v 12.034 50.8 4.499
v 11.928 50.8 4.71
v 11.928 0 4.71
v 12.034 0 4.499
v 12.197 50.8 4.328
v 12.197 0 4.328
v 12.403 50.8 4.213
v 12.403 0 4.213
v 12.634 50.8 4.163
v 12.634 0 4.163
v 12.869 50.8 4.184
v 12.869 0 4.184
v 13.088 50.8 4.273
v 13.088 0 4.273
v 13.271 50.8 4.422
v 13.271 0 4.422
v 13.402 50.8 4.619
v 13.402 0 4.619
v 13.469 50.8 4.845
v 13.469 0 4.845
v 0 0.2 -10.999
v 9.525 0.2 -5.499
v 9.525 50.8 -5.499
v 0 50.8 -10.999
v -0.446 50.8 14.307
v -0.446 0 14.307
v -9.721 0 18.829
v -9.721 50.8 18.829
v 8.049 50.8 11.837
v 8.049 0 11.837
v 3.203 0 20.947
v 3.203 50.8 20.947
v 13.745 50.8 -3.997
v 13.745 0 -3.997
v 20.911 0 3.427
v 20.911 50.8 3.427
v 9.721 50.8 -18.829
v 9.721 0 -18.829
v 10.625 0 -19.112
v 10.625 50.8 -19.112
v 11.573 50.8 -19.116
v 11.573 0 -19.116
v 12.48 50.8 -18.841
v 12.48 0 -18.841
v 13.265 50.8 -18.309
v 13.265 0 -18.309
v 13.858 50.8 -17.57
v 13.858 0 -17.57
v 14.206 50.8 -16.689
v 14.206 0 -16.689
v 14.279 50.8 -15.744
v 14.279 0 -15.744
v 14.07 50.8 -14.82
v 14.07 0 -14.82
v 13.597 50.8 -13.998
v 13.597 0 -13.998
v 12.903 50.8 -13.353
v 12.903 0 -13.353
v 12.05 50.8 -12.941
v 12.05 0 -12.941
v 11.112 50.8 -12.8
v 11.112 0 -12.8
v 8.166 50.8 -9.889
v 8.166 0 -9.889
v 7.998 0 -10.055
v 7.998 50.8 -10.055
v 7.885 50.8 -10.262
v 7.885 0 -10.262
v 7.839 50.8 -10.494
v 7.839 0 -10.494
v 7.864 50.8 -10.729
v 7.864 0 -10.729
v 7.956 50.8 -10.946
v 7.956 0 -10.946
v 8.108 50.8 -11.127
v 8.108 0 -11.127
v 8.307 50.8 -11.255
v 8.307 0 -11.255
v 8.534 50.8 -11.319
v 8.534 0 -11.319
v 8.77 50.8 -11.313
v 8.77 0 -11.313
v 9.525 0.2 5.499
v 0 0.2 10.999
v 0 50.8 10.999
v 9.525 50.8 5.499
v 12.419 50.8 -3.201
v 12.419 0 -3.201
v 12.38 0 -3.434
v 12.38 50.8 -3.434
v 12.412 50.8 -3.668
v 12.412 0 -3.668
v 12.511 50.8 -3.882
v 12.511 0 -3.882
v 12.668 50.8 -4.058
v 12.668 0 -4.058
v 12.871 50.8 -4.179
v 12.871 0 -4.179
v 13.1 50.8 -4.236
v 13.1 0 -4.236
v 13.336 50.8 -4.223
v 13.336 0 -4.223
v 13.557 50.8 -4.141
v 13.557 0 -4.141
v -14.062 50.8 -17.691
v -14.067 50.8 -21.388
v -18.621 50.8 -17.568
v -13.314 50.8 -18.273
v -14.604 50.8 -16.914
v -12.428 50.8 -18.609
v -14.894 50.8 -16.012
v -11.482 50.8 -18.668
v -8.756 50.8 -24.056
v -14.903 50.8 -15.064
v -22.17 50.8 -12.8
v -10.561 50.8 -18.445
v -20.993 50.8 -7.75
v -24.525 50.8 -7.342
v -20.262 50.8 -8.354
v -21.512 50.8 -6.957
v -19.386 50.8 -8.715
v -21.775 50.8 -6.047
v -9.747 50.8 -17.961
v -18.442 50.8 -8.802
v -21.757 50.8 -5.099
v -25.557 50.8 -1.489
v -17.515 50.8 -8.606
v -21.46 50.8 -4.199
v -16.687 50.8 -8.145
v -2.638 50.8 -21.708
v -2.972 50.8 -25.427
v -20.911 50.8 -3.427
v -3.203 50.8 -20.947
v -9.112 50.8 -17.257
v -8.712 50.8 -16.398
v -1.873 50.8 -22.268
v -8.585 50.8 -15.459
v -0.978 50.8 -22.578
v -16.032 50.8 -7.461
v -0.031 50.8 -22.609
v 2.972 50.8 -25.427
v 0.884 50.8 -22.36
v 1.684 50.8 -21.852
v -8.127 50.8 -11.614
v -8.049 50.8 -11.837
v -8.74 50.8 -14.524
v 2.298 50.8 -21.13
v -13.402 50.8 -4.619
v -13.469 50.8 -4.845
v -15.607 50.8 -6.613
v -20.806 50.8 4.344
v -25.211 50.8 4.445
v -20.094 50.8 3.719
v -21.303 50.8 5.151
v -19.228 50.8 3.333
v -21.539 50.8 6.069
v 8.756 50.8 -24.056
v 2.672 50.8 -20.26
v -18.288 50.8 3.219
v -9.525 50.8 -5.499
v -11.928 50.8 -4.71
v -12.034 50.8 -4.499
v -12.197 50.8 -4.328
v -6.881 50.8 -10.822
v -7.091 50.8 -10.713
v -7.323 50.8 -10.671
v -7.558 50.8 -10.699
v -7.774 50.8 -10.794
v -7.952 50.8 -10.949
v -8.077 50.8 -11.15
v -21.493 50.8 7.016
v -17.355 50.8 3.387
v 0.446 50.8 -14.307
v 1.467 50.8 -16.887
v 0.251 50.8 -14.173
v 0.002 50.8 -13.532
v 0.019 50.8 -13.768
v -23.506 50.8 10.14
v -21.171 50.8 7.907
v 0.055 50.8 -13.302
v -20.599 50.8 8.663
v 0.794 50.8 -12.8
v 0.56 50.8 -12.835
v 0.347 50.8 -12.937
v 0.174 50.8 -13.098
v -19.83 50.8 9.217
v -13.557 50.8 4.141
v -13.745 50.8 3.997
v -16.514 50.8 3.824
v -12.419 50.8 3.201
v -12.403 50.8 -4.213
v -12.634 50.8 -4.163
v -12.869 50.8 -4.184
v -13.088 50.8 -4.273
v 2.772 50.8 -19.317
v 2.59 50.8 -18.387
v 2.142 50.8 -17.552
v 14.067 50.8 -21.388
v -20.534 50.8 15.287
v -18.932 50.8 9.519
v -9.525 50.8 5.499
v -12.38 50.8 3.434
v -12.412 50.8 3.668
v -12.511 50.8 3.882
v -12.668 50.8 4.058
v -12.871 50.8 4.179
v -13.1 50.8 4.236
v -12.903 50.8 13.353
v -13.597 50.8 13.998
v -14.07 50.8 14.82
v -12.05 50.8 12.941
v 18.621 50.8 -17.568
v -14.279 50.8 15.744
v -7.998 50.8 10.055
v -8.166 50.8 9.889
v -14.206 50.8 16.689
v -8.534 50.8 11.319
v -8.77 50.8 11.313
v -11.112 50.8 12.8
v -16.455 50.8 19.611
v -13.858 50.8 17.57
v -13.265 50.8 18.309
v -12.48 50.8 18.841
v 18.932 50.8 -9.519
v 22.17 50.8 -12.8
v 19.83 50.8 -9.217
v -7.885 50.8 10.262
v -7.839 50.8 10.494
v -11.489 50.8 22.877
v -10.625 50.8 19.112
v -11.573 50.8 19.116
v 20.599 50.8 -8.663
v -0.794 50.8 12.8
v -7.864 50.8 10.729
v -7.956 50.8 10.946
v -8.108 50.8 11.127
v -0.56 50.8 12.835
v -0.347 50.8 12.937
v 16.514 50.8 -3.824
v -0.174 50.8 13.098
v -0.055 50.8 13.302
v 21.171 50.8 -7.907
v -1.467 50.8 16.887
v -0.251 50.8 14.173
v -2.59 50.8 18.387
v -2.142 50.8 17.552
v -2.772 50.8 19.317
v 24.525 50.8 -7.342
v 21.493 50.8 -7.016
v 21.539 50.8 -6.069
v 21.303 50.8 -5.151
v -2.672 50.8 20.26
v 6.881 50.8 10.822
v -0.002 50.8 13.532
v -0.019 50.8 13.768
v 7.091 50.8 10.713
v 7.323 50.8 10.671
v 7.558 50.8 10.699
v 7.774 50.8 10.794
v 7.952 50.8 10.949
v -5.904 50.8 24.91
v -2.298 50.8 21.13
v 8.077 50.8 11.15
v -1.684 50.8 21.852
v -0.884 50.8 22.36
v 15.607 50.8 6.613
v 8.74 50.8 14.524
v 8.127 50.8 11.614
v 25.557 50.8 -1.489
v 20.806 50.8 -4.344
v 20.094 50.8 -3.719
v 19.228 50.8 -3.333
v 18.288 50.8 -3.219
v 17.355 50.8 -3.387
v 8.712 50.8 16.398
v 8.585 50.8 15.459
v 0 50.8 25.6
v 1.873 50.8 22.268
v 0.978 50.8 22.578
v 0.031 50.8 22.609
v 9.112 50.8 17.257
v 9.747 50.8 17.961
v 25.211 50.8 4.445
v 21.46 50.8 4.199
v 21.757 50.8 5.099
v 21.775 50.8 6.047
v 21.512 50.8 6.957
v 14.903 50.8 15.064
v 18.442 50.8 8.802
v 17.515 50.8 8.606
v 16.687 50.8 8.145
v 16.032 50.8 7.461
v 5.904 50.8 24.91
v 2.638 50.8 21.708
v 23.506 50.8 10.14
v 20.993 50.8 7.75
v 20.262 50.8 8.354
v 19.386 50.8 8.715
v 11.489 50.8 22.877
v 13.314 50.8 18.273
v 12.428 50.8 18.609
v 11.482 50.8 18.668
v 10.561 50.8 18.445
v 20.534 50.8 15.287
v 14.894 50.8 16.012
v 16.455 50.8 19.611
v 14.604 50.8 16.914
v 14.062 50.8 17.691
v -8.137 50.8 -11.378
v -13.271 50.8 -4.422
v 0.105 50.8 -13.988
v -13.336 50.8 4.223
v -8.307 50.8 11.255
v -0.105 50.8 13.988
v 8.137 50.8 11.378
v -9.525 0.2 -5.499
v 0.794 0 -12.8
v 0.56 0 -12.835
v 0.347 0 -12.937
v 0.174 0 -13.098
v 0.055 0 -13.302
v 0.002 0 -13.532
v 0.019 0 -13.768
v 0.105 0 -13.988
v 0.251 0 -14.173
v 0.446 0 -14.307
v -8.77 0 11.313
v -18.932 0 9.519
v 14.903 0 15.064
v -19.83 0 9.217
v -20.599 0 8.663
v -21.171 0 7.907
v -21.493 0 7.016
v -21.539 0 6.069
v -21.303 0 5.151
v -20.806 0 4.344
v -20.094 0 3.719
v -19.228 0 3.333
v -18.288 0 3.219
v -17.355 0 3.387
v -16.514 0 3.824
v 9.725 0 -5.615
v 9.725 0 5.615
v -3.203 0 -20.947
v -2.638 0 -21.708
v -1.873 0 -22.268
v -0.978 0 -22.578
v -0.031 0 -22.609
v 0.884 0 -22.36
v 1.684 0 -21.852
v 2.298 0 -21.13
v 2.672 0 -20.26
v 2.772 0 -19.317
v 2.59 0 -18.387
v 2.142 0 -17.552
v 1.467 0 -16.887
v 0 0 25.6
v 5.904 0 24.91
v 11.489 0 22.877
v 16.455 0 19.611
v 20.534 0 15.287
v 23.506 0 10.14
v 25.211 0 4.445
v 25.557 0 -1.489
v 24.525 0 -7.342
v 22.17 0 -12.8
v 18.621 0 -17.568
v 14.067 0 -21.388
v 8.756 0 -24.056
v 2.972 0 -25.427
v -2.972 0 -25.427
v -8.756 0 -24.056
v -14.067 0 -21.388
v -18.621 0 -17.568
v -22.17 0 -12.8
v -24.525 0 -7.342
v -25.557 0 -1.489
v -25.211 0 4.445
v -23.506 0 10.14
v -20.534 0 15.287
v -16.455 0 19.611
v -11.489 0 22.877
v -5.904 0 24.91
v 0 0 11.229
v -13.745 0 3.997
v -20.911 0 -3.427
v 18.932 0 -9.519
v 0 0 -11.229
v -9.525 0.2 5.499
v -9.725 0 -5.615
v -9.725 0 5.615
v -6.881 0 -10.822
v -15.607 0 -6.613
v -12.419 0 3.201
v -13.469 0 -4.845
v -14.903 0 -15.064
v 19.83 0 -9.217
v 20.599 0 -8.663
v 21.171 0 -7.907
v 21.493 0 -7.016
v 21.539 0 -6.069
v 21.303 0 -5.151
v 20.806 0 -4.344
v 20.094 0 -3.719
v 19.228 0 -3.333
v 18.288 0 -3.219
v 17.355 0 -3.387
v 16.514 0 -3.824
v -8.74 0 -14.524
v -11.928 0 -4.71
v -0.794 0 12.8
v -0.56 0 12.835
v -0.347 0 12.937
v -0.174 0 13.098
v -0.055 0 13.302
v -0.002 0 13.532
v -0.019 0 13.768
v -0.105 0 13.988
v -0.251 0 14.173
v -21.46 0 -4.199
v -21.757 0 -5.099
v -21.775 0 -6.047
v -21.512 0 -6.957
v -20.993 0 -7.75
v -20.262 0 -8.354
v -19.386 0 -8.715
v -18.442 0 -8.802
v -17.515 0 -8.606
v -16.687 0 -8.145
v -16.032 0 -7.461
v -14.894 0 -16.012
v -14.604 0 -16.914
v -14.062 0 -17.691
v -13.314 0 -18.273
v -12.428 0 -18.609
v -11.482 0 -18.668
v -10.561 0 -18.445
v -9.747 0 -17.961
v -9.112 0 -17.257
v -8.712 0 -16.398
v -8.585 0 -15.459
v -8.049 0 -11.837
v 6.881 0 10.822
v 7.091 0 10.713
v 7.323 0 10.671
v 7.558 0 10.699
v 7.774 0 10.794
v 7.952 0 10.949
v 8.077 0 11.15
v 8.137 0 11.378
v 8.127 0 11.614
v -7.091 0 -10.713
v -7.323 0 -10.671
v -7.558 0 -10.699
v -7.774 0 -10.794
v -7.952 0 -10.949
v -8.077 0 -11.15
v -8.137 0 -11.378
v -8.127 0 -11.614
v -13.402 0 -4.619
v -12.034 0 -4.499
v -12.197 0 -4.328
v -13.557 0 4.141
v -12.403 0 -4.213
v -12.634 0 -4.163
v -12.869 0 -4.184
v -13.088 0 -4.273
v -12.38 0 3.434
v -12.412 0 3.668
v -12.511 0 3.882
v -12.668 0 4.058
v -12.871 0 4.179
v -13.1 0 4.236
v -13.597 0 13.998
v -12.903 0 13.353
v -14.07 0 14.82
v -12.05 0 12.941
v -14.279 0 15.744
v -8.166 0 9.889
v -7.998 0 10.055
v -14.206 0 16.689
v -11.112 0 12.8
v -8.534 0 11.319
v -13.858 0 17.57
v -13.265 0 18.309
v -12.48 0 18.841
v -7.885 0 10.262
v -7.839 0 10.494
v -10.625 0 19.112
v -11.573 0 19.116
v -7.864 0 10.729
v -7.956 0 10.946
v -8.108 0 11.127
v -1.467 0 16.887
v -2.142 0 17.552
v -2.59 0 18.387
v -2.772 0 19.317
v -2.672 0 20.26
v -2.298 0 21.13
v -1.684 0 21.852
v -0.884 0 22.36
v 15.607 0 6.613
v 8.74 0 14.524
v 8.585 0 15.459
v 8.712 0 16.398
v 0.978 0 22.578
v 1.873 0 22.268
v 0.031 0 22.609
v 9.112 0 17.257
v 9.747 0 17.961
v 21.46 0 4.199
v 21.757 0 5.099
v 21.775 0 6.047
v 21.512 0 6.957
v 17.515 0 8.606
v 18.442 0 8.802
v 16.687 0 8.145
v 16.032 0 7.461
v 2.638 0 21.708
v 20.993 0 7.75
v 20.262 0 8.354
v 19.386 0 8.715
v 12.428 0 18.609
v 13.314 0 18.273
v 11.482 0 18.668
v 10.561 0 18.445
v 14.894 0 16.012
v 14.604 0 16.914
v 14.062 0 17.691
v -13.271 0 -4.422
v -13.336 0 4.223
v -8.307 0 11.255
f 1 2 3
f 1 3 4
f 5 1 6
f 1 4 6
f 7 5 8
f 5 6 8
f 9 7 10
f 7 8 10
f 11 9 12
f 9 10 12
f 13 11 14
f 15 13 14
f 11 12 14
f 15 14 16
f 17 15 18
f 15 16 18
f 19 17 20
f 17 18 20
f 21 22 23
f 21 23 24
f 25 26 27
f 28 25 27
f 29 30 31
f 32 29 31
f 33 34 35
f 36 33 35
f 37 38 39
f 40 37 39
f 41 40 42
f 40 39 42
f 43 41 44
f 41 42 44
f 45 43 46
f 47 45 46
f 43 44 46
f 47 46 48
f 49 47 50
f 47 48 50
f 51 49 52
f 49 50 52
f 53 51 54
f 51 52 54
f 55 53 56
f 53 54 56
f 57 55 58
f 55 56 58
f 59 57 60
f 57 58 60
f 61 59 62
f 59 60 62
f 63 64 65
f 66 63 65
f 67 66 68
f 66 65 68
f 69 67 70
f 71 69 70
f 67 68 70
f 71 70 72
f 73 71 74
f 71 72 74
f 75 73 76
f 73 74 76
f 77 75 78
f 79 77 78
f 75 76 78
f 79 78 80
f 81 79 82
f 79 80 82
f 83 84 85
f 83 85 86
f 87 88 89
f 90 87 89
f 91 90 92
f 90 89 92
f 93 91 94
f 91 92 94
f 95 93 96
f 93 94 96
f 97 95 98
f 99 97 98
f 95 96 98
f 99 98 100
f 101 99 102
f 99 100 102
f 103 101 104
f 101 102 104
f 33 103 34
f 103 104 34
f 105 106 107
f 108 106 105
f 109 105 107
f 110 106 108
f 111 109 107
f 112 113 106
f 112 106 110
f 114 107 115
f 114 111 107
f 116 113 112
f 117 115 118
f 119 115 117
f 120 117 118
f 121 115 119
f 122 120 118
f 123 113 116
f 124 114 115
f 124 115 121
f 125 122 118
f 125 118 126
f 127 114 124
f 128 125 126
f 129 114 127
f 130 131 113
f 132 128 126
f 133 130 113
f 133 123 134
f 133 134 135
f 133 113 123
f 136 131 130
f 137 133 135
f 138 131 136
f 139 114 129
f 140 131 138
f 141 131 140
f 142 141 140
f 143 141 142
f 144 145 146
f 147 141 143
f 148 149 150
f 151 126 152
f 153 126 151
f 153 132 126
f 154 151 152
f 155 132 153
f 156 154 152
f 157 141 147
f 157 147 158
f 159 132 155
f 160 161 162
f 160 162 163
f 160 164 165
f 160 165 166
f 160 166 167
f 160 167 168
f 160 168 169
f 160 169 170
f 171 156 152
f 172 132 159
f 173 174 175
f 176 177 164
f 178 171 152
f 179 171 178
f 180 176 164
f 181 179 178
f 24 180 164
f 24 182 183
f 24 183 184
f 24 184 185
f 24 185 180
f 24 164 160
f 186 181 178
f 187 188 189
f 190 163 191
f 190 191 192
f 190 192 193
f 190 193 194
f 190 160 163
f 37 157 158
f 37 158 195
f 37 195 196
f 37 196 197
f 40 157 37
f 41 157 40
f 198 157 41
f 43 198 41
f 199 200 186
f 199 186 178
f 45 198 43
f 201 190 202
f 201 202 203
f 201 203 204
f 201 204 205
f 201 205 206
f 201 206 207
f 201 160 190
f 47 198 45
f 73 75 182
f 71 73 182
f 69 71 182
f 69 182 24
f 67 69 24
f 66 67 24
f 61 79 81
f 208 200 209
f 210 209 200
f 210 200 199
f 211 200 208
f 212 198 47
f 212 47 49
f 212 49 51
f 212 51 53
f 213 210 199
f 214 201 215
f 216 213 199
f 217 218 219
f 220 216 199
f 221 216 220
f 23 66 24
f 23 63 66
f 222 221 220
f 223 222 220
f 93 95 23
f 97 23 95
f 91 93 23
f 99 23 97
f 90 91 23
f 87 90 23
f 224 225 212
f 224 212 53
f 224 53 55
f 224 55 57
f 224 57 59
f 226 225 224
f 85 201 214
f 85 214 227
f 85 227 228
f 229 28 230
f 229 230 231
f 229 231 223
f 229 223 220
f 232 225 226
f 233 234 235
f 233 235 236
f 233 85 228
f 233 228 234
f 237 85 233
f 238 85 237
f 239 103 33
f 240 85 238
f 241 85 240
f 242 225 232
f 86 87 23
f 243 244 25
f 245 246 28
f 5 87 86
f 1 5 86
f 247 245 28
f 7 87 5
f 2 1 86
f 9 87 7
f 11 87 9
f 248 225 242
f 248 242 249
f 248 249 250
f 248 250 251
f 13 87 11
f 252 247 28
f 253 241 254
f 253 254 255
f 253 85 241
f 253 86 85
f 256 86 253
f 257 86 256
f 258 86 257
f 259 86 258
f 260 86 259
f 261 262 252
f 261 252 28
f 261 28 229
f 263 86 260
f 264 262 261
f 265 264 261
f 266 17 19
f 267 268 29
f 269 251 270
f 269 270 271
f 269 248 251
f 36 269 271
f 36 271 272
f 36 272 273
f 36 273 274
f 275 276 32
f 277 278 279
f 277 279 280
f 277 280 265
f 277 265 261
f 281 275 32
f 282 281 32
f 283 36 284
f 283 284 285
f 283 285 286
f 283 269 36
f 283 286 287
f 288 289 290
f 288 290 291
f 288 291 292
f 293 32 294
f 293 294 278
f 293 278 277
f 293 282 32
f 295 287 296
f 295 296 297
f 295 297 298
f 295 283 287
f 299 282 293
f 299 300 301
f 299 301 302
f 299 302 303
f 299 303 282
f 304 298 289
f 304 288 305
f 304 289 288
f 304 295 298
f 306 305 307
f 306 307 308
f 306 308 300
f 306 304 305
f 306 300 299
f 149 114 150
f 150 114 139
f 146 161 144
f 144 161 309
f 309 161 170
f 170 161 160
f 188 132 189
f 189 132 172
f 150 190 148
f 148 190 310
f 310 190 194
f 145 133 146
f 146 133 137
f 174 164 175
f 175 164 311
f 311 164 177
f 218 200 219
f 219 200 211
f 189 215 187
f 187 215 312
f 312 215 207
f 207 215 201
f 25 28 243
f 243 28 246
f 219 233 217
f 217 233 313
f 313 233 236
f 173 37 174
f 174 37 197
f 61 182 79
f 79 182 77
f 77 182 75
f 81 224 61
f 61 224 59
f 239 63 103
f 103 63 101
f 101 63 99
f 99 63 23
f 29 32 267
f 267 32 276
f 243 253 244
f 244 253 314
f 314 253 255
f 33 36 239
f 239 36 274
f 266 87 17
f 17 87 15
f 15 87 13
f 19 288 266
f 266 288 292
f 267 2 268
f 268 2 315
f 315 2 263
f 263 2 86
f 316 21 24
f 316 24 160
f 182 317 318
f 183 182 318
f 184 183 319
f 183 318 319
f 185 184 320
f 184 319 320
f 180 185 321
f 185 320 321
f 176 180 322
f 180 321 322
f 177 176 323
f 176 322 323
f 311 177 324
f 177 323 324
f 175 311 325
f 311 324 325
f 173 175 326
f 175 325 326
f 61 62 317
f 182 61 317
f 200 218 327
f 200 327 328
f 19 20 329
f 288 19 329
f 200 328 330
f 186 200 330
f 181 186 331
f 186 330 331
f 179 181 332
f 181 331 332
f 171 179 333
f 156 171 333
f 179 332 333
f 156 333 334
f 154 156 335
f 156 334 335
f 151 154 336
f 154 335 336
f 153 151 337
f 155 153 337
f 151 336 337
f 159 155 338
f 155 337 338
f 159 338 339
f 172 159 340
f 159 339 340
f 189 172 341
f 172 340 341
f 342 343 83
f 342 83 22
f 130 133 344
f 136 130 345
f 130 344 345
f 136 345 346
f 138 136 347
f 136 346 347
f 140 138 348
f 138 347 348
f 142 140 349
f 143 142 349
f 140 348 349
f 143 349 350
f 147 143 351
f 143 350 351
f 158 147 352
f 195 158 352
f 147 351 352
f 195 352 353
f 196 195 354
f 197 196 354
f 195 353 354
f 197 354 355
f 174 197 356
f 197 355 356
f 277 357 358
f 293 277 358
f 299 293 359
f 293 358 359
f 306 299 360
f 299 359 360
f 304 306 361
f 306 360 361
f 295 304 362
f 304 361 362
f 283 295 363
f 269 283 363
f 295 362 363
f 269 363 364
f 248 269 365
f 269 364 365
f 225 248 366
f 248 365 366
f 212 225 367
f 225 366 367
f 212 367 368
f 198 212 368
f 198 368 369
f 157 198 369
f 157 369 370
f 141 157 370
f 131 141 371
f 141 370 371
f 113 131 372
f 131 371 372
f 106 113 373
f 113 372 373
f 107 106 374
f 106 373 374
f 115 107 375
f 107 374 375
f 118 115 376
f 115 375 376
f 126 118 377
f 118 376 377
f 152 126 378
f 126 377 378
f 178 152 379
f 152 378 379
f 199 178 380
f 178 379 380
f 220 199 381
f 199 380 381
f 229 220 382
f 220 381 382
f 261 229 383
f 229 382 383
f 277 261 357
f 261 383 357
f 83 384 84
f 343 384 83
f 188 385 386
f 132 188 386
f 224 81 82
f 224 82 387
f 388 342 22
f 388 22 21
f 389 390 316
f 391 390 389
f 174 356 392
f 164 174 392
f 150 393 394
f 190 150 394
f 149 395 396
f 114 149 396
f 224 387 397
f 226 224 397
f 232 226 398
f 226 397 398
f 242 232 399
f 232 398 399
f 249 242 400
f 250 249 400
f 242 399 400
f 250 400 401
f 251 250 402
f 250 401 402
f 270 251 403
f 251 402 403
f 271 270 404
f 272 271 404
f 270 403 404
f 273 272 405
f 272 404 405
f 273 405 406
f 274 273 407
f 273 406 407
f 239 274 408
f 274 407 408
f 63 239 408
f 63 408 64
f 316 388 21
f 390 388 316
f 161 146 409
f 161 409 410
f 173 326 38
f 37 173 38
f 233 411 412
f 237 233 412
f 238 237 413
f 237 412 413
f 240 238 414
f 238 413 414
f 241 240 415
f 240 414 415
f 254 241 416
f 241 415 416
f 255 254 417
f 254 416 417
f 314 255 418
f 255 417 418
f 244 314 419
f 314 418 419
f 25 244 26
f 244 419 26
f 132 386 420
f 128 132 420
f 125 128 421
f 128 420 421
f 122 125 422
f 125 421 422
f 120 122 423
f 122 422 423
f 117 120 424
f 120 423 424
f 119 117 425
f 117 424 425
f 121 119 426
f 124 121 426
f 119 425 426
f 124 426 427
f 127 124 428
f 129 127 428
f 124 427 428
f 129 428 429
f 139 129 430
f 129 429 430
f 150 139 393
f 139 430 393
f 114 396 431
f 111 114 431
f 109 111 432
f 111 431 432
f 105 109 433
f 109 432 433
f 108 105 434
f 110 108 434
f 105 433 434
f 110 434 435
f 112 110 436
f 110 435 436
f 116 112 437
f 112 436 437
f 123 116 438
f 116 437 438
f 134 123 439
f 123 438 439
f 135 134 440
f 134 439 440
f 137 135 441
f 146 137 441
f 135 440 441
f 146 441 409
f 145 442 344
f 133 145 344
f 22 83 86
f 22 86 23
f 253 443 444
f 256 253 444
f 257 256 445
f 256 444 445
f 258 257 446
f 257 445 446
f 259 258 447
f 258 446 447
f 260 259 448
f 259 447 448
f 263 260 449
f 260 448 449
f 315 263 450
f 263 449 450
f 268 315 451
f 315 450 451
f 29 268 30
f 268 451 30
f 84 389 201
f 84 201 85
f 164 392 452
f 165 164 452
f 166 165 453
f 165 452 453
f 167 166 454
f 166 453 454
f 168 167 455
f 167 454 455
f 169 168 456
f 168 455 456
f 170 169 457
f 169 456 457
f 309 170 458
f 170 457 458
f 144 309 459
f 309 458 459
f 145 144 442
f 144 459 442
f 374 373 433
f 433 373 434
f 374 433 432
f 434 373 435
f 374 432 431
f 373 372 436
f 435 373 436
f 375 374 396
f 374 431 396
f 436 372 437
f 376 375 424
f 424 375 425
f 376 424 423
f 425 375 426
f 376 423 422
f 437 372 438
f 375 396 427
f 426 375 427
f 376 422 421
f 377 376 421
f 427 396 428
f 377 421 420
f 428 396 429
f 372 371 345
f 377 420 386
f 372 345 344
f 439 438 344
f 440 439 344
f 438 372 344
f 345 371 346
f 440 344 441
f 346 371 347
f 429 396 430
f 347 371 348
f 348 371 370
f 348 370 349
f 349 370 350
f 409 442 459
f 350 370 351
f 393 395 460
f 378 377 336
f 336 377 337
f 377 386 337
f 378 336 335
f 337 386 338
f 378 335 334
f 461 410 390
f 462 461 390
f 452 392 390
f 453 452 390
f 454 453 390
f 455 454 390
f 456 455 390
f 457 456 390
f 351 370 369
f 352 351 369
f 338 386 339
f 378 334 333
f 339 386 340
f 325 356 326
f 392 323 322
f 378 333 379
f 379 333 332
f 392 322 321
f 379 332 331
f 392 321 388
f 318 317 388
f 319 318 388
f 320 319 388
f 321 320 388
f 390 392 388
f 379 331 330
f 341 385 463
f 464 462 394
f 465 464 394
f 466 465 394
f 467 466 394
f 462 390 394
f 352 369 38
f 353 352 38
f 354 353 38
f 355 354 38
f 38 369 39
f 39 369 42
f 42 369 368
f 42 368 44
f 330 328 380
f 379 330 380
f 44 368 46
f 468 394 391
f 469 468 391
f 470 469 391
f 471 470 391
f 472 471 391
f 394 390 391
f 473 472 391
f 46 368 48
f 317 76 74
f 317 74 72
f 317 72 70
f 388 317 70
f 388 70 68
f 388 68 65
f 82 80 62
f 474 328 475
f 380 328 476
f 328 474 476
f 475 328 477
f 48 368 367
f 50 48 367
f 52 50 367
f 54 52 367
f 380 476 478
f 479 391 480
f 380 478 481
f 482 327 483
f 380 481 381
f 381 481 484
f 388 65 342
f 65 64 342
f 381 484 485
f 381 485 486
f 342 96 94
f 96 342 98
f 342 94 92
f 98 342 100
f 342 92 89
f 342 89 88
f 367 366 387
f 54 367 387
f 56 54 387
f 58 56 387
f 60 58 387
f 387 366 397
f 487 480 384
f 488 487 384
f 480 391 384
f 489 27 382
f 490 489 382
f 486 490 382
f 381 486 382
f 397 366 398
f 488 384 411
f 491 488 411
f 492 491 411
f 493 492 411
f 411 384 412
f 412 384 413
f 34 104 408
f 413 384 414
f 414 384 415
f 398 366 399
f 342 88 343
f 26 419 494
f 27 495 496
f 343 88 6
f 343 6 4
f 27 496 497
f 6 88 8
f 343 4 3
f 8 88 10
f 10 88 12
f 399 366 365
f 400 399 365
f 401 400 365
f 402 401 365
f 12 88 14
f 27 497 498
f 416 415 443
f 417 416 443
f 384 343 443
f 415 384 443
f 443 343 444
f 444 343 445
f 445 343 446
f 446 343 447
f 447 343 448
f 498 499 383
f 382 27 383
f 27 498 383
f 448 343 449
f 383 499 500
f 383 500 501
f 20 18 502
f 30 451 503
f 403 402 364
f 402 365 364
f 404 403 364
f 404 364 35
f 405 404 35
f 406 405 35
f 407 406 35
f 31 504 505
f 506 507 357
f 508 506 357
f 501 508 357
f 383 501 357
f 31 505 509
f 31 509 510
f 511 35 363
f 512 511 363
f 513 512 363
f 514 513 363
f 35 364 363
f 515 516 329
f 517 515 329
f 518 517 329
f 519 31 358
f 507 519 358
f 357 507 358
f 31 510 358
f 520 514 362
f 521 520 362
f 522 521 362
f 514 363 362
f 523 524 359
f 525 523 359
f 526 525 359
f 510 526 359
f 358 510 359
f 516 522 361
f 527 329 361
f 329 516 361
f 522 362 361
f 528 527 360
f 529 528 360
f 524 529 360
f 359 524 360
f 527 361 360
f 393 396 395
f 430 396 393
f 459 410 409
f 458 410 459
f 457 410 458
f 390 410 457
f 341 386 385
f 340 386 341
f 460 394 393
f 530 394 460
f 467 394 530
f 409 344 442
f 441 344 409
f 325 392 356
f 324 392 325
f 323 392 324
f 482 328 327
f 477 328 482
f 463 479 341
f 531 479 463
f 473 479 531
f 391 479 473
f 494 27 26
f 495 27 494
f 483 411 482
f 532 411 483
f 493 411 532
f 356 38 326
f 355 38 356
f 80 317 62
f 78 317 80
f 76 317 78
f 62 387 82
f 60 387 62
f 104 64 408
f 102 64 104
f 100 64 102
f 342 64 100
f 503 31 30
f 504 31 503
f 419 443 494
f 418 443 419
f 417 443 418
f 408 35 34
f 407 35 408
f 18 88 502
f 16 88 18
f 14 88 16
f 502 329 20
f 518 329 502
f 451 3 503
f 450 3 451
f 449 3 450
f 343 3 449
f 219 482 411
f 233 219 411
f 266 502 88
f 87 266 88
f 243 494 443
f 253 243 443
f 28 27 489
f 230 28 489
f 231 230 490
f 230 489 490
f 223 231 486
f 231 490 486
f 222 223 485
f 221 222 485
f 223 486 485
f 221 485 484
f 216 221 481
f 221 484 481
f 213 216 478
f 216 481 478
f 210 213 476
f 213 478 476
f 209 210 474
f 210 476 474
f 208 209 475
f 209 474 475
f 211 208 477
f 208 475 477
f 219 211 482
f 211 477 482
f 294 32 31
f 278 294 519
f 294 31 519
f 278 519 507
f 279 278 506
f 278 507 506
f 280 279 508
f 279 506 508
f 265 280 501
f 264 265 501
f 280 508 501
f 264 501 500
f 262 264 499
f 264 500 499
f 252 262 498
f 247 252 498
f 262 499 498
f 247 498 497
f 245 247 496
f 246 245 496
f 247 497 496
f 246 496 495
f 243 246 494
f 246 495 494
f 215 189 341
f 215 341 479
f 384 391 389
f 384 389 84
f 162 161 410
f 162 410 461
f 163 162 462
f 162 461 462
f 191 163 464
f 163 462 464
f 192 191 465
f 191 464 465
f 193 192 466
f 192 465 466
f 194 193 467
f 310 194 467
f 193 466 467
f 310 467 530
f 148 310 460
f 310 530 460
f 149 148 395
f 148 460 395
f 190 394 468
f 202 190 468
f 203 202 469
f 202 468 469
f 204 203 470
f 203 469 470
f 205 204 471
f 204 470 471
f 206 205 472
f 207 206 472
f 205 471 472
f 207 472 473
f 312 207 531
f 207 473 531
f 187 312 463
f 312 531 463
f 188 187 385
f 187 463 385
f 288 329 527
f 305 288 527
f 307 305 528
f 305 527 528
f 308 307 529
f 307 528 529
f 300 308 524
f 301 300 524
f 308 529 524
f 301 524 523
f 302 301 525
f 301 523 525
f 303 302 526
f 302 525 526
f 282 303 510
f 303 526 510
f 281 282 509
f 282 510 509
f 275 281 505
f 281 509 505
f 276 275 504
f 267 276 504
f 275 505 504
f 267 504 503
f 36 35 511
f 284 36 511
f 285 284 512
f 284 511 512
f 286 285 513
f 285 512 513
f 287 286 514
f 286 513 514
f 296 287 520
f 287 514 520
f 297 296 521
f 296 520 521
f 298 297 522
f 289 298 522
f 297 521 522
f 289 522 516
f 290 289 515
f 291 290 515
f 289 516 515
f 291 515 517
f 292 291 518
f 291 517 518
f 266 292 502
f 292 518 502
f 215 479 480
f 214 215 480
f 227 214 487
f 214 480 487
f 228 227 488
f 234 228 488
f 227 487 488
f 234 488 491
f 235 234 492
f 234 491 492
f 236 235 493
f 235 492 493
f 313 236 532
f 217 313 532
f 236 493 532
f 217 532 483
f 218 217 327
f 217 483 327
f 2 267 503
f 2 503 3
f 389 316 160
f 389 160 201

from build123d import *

# Parameters (mm, degrees)
SKETCH1_R           = 25.6
BOSS_EXTRUDE1_DEPTH = 50.8
CHAMFER1_SIZE       = 0.2


with BuildPart() as part:
    # Sketch1 → Boss-Extrude1 (new body)
    with BuildSketch(Plane(origin=(0, 0, 0), x_dir=(1, 0, 0), z_dir=(0, 1, 0))):
        with Locations(Location((0, 0, 0), (0, 0, 270))):
            Circle(SKETCH1_R)
        with BuildLine():
            Line((0.445926966, 14.307233146), (9.721207865, 18.828932584))
            ThreePointArc((9.721207865, 18.828932584), (14.206192046, 16.688928934), (11.1125, 12.8))
            Line((11.1125, 12.8), (0.79375, 12.8))
            ThreePointArc((0.79375, 12.8), (0.020326988, 13.415267767), (0.445926966, 14.307233146))
        make_face(mode=Mode.SUBTRACT)
        with BuildLine():
            Line((8.770343138, 11.312685463), (18.931991258, 9.518943829))
            ThreePointArc((18.931991258, 9.518943829), (21.302557095, 5.151436949), (16.513852579, 3.823653912))
            Line((16.513852579, 3.823653912), (8.165808469, 9.888862984))
            ThreePointArc((8.165808469, 9.888862984), (7.901741428, 10.841231703), (8.770343138, 11.312685463))
        make_face(mode=Mode.SUBTRACT)
        with BuildLine():
            Line((13.744786325, 3.997076438), (20.911397465, -3.426957932))
            ThreePointArc((20.911397465, -3.426957932), (20.26206938, -8.353728859), (15.607474759, -6.613198009))
            Line((15.607474759, -6.613198009), (12.418805648, 3.200516418))
            ThreePointArc((12.418805648, 3.200516418), (12.764959212, 4.126213609), (13.744786325, 3.997076438))
        make_face(mode=Mode.SUBTRACT)
        with BuildLine():
            Line((13.469188303, -4.845279932), (14.903360593, -15.063878241))
            ThreePointArc((14.903360593, -15.063878241), (11.482159845, -18.668054176), (8.739572059, -14.524033065))
            Line((8.739572059, -14.524033065), (11.928241169, -4.710318638))
            ThreePointArc((11.928241169, -4.710318638), (12.752396442, -4.164877839), (13.469188303, -4.845279932))
        make_face(mode=Mode.SUBTRACT)
        with BuildLine():
            Line((8.04881815, -11.836904052), (3.202746521, -20.946909064))
            ThreePointArc((3.202746521, -20.946909064), (-1.683544487, -21.851817301), (-1.466550121, -16.887181144))
            Line((-1.466550121, -16.887181144), (6.88149399, -10.821972072))
            ThreePointArc((6.88149399, -10.821972072), (7.86885167, -10.865127511), (8.04881815, -11.836904052))
        make_face(mode=Mode.SUBTRACT)
        with BuildLine():
            Line((-0.445926966, -14.307233146), (-9.721207865, -18.828932584))
            ThreePointArc((-9.721207865, -18.828932584), (-14.206192046, -16.688928934), (-11.1125, -12.8))
            Line((-11.1125, -12.8), (-0.79375, -12.8))
            ThreePointArc((-0.79375, -12.8), (-0.020326988, -13.415267767), (-0.445926966, -14.307233146))
        make_face(mode=Mode.SUBTRACT)
        with BuildLine():
            Line((-8.770343138, -11.312685463), (-18.931991258, -9.518943829))
            ThreePointArc((-18.931991258, -9.518943829), (-21.302557095, -5.151436949), (-16.513852579, -3.823653912))
            Line((-16.513852579, -3.823653912), (-8.165808469, -9.888862984))
            ThreePointArc((-8.165808469, -9.888862984), (-7.901741428, -10.841231703), (-8.770343138, -11.312685463))
        make_face(mode=Mode.SUBTRACT)
        with BuildLine():
            Line((-13.744786325, -3.997076438), (-20.911397465, 3.426957932))
            ThreePointArc((-20.911397465, 3.426957932), (-20.26206938, 8.353728859), (-15.607474759, 6.613198009))
            Line((-15.607474759, 6.613198009), (-12.418805648, -3.200516418))
            ThreePointArc((-12.418805648, -3.200516418), (-12.764959212, -4.126213609), (-13.744786325, -3.997076438))
        make_face(mode=Mode.SUBTRACT)
        with BuildLine():
            Line((-13.469188303, 4.845279932), (-14.903360593, 15.063878241))
            ThreePointArc((-14.903360593, 15.063878241), (-11.482159845, 18.668054176), (-8.739572059, 14.524033065))
            Line((-8.739572059, 14.524033065), (-11.928241169, 4.710318638))
            ThreePointArc((-11.928241169, 4.710318638), (-12.752396442, 4.164877839), (-13.469188303, 4.845279932))
        make_face(mode=Mode.SUBTRACT)
        with BuildLine():
            Line((-8.04881815, 11.836904052), (-3.202746521, 20.946909064))
            ThreePointArc((-3.202746521, 20.946909064), (1.683544487, 21.851817301), (1.466550121, 16.887181144))
            Line((1.466550121, 16.887181144), (-6.88149399, 10.821972072))
            ThreePointArc((-6.88149399, 10.821972072), (-7.86885167, 10.865127511), (-8.04881815, 11.836904052))
        make_face(mode=Mode.SUBTRACT)
        Polygon((0, 10.998522628), (-9.525, 5.499261314), (-9.525, -5.499261314), (0, -10.998522628), (9.525, -5.499261314), (9.525, 5.499261314), align=None, mode=Mode.SUBTRACT)
    extrude(amount=BOSS_EXTRUDE1_DEPTH)

    # Chamfer1
    chamfer1_edges = [part.edges().sort_by_distance(p)[0] for p in [
        (-4.7625, 0, -8.248891971),
        (-9.525, 0, 0),
        (-4.7625, 0, 8.248891971),
        (4.7625, 0, 8.248891971),
        (9.525, 0, 0),
        (4.7625, 0, -8.248891971),
    ]]
    chamfer(chamfer1_edges, length=CHAMFER1_SIZE)


solid = part.part
